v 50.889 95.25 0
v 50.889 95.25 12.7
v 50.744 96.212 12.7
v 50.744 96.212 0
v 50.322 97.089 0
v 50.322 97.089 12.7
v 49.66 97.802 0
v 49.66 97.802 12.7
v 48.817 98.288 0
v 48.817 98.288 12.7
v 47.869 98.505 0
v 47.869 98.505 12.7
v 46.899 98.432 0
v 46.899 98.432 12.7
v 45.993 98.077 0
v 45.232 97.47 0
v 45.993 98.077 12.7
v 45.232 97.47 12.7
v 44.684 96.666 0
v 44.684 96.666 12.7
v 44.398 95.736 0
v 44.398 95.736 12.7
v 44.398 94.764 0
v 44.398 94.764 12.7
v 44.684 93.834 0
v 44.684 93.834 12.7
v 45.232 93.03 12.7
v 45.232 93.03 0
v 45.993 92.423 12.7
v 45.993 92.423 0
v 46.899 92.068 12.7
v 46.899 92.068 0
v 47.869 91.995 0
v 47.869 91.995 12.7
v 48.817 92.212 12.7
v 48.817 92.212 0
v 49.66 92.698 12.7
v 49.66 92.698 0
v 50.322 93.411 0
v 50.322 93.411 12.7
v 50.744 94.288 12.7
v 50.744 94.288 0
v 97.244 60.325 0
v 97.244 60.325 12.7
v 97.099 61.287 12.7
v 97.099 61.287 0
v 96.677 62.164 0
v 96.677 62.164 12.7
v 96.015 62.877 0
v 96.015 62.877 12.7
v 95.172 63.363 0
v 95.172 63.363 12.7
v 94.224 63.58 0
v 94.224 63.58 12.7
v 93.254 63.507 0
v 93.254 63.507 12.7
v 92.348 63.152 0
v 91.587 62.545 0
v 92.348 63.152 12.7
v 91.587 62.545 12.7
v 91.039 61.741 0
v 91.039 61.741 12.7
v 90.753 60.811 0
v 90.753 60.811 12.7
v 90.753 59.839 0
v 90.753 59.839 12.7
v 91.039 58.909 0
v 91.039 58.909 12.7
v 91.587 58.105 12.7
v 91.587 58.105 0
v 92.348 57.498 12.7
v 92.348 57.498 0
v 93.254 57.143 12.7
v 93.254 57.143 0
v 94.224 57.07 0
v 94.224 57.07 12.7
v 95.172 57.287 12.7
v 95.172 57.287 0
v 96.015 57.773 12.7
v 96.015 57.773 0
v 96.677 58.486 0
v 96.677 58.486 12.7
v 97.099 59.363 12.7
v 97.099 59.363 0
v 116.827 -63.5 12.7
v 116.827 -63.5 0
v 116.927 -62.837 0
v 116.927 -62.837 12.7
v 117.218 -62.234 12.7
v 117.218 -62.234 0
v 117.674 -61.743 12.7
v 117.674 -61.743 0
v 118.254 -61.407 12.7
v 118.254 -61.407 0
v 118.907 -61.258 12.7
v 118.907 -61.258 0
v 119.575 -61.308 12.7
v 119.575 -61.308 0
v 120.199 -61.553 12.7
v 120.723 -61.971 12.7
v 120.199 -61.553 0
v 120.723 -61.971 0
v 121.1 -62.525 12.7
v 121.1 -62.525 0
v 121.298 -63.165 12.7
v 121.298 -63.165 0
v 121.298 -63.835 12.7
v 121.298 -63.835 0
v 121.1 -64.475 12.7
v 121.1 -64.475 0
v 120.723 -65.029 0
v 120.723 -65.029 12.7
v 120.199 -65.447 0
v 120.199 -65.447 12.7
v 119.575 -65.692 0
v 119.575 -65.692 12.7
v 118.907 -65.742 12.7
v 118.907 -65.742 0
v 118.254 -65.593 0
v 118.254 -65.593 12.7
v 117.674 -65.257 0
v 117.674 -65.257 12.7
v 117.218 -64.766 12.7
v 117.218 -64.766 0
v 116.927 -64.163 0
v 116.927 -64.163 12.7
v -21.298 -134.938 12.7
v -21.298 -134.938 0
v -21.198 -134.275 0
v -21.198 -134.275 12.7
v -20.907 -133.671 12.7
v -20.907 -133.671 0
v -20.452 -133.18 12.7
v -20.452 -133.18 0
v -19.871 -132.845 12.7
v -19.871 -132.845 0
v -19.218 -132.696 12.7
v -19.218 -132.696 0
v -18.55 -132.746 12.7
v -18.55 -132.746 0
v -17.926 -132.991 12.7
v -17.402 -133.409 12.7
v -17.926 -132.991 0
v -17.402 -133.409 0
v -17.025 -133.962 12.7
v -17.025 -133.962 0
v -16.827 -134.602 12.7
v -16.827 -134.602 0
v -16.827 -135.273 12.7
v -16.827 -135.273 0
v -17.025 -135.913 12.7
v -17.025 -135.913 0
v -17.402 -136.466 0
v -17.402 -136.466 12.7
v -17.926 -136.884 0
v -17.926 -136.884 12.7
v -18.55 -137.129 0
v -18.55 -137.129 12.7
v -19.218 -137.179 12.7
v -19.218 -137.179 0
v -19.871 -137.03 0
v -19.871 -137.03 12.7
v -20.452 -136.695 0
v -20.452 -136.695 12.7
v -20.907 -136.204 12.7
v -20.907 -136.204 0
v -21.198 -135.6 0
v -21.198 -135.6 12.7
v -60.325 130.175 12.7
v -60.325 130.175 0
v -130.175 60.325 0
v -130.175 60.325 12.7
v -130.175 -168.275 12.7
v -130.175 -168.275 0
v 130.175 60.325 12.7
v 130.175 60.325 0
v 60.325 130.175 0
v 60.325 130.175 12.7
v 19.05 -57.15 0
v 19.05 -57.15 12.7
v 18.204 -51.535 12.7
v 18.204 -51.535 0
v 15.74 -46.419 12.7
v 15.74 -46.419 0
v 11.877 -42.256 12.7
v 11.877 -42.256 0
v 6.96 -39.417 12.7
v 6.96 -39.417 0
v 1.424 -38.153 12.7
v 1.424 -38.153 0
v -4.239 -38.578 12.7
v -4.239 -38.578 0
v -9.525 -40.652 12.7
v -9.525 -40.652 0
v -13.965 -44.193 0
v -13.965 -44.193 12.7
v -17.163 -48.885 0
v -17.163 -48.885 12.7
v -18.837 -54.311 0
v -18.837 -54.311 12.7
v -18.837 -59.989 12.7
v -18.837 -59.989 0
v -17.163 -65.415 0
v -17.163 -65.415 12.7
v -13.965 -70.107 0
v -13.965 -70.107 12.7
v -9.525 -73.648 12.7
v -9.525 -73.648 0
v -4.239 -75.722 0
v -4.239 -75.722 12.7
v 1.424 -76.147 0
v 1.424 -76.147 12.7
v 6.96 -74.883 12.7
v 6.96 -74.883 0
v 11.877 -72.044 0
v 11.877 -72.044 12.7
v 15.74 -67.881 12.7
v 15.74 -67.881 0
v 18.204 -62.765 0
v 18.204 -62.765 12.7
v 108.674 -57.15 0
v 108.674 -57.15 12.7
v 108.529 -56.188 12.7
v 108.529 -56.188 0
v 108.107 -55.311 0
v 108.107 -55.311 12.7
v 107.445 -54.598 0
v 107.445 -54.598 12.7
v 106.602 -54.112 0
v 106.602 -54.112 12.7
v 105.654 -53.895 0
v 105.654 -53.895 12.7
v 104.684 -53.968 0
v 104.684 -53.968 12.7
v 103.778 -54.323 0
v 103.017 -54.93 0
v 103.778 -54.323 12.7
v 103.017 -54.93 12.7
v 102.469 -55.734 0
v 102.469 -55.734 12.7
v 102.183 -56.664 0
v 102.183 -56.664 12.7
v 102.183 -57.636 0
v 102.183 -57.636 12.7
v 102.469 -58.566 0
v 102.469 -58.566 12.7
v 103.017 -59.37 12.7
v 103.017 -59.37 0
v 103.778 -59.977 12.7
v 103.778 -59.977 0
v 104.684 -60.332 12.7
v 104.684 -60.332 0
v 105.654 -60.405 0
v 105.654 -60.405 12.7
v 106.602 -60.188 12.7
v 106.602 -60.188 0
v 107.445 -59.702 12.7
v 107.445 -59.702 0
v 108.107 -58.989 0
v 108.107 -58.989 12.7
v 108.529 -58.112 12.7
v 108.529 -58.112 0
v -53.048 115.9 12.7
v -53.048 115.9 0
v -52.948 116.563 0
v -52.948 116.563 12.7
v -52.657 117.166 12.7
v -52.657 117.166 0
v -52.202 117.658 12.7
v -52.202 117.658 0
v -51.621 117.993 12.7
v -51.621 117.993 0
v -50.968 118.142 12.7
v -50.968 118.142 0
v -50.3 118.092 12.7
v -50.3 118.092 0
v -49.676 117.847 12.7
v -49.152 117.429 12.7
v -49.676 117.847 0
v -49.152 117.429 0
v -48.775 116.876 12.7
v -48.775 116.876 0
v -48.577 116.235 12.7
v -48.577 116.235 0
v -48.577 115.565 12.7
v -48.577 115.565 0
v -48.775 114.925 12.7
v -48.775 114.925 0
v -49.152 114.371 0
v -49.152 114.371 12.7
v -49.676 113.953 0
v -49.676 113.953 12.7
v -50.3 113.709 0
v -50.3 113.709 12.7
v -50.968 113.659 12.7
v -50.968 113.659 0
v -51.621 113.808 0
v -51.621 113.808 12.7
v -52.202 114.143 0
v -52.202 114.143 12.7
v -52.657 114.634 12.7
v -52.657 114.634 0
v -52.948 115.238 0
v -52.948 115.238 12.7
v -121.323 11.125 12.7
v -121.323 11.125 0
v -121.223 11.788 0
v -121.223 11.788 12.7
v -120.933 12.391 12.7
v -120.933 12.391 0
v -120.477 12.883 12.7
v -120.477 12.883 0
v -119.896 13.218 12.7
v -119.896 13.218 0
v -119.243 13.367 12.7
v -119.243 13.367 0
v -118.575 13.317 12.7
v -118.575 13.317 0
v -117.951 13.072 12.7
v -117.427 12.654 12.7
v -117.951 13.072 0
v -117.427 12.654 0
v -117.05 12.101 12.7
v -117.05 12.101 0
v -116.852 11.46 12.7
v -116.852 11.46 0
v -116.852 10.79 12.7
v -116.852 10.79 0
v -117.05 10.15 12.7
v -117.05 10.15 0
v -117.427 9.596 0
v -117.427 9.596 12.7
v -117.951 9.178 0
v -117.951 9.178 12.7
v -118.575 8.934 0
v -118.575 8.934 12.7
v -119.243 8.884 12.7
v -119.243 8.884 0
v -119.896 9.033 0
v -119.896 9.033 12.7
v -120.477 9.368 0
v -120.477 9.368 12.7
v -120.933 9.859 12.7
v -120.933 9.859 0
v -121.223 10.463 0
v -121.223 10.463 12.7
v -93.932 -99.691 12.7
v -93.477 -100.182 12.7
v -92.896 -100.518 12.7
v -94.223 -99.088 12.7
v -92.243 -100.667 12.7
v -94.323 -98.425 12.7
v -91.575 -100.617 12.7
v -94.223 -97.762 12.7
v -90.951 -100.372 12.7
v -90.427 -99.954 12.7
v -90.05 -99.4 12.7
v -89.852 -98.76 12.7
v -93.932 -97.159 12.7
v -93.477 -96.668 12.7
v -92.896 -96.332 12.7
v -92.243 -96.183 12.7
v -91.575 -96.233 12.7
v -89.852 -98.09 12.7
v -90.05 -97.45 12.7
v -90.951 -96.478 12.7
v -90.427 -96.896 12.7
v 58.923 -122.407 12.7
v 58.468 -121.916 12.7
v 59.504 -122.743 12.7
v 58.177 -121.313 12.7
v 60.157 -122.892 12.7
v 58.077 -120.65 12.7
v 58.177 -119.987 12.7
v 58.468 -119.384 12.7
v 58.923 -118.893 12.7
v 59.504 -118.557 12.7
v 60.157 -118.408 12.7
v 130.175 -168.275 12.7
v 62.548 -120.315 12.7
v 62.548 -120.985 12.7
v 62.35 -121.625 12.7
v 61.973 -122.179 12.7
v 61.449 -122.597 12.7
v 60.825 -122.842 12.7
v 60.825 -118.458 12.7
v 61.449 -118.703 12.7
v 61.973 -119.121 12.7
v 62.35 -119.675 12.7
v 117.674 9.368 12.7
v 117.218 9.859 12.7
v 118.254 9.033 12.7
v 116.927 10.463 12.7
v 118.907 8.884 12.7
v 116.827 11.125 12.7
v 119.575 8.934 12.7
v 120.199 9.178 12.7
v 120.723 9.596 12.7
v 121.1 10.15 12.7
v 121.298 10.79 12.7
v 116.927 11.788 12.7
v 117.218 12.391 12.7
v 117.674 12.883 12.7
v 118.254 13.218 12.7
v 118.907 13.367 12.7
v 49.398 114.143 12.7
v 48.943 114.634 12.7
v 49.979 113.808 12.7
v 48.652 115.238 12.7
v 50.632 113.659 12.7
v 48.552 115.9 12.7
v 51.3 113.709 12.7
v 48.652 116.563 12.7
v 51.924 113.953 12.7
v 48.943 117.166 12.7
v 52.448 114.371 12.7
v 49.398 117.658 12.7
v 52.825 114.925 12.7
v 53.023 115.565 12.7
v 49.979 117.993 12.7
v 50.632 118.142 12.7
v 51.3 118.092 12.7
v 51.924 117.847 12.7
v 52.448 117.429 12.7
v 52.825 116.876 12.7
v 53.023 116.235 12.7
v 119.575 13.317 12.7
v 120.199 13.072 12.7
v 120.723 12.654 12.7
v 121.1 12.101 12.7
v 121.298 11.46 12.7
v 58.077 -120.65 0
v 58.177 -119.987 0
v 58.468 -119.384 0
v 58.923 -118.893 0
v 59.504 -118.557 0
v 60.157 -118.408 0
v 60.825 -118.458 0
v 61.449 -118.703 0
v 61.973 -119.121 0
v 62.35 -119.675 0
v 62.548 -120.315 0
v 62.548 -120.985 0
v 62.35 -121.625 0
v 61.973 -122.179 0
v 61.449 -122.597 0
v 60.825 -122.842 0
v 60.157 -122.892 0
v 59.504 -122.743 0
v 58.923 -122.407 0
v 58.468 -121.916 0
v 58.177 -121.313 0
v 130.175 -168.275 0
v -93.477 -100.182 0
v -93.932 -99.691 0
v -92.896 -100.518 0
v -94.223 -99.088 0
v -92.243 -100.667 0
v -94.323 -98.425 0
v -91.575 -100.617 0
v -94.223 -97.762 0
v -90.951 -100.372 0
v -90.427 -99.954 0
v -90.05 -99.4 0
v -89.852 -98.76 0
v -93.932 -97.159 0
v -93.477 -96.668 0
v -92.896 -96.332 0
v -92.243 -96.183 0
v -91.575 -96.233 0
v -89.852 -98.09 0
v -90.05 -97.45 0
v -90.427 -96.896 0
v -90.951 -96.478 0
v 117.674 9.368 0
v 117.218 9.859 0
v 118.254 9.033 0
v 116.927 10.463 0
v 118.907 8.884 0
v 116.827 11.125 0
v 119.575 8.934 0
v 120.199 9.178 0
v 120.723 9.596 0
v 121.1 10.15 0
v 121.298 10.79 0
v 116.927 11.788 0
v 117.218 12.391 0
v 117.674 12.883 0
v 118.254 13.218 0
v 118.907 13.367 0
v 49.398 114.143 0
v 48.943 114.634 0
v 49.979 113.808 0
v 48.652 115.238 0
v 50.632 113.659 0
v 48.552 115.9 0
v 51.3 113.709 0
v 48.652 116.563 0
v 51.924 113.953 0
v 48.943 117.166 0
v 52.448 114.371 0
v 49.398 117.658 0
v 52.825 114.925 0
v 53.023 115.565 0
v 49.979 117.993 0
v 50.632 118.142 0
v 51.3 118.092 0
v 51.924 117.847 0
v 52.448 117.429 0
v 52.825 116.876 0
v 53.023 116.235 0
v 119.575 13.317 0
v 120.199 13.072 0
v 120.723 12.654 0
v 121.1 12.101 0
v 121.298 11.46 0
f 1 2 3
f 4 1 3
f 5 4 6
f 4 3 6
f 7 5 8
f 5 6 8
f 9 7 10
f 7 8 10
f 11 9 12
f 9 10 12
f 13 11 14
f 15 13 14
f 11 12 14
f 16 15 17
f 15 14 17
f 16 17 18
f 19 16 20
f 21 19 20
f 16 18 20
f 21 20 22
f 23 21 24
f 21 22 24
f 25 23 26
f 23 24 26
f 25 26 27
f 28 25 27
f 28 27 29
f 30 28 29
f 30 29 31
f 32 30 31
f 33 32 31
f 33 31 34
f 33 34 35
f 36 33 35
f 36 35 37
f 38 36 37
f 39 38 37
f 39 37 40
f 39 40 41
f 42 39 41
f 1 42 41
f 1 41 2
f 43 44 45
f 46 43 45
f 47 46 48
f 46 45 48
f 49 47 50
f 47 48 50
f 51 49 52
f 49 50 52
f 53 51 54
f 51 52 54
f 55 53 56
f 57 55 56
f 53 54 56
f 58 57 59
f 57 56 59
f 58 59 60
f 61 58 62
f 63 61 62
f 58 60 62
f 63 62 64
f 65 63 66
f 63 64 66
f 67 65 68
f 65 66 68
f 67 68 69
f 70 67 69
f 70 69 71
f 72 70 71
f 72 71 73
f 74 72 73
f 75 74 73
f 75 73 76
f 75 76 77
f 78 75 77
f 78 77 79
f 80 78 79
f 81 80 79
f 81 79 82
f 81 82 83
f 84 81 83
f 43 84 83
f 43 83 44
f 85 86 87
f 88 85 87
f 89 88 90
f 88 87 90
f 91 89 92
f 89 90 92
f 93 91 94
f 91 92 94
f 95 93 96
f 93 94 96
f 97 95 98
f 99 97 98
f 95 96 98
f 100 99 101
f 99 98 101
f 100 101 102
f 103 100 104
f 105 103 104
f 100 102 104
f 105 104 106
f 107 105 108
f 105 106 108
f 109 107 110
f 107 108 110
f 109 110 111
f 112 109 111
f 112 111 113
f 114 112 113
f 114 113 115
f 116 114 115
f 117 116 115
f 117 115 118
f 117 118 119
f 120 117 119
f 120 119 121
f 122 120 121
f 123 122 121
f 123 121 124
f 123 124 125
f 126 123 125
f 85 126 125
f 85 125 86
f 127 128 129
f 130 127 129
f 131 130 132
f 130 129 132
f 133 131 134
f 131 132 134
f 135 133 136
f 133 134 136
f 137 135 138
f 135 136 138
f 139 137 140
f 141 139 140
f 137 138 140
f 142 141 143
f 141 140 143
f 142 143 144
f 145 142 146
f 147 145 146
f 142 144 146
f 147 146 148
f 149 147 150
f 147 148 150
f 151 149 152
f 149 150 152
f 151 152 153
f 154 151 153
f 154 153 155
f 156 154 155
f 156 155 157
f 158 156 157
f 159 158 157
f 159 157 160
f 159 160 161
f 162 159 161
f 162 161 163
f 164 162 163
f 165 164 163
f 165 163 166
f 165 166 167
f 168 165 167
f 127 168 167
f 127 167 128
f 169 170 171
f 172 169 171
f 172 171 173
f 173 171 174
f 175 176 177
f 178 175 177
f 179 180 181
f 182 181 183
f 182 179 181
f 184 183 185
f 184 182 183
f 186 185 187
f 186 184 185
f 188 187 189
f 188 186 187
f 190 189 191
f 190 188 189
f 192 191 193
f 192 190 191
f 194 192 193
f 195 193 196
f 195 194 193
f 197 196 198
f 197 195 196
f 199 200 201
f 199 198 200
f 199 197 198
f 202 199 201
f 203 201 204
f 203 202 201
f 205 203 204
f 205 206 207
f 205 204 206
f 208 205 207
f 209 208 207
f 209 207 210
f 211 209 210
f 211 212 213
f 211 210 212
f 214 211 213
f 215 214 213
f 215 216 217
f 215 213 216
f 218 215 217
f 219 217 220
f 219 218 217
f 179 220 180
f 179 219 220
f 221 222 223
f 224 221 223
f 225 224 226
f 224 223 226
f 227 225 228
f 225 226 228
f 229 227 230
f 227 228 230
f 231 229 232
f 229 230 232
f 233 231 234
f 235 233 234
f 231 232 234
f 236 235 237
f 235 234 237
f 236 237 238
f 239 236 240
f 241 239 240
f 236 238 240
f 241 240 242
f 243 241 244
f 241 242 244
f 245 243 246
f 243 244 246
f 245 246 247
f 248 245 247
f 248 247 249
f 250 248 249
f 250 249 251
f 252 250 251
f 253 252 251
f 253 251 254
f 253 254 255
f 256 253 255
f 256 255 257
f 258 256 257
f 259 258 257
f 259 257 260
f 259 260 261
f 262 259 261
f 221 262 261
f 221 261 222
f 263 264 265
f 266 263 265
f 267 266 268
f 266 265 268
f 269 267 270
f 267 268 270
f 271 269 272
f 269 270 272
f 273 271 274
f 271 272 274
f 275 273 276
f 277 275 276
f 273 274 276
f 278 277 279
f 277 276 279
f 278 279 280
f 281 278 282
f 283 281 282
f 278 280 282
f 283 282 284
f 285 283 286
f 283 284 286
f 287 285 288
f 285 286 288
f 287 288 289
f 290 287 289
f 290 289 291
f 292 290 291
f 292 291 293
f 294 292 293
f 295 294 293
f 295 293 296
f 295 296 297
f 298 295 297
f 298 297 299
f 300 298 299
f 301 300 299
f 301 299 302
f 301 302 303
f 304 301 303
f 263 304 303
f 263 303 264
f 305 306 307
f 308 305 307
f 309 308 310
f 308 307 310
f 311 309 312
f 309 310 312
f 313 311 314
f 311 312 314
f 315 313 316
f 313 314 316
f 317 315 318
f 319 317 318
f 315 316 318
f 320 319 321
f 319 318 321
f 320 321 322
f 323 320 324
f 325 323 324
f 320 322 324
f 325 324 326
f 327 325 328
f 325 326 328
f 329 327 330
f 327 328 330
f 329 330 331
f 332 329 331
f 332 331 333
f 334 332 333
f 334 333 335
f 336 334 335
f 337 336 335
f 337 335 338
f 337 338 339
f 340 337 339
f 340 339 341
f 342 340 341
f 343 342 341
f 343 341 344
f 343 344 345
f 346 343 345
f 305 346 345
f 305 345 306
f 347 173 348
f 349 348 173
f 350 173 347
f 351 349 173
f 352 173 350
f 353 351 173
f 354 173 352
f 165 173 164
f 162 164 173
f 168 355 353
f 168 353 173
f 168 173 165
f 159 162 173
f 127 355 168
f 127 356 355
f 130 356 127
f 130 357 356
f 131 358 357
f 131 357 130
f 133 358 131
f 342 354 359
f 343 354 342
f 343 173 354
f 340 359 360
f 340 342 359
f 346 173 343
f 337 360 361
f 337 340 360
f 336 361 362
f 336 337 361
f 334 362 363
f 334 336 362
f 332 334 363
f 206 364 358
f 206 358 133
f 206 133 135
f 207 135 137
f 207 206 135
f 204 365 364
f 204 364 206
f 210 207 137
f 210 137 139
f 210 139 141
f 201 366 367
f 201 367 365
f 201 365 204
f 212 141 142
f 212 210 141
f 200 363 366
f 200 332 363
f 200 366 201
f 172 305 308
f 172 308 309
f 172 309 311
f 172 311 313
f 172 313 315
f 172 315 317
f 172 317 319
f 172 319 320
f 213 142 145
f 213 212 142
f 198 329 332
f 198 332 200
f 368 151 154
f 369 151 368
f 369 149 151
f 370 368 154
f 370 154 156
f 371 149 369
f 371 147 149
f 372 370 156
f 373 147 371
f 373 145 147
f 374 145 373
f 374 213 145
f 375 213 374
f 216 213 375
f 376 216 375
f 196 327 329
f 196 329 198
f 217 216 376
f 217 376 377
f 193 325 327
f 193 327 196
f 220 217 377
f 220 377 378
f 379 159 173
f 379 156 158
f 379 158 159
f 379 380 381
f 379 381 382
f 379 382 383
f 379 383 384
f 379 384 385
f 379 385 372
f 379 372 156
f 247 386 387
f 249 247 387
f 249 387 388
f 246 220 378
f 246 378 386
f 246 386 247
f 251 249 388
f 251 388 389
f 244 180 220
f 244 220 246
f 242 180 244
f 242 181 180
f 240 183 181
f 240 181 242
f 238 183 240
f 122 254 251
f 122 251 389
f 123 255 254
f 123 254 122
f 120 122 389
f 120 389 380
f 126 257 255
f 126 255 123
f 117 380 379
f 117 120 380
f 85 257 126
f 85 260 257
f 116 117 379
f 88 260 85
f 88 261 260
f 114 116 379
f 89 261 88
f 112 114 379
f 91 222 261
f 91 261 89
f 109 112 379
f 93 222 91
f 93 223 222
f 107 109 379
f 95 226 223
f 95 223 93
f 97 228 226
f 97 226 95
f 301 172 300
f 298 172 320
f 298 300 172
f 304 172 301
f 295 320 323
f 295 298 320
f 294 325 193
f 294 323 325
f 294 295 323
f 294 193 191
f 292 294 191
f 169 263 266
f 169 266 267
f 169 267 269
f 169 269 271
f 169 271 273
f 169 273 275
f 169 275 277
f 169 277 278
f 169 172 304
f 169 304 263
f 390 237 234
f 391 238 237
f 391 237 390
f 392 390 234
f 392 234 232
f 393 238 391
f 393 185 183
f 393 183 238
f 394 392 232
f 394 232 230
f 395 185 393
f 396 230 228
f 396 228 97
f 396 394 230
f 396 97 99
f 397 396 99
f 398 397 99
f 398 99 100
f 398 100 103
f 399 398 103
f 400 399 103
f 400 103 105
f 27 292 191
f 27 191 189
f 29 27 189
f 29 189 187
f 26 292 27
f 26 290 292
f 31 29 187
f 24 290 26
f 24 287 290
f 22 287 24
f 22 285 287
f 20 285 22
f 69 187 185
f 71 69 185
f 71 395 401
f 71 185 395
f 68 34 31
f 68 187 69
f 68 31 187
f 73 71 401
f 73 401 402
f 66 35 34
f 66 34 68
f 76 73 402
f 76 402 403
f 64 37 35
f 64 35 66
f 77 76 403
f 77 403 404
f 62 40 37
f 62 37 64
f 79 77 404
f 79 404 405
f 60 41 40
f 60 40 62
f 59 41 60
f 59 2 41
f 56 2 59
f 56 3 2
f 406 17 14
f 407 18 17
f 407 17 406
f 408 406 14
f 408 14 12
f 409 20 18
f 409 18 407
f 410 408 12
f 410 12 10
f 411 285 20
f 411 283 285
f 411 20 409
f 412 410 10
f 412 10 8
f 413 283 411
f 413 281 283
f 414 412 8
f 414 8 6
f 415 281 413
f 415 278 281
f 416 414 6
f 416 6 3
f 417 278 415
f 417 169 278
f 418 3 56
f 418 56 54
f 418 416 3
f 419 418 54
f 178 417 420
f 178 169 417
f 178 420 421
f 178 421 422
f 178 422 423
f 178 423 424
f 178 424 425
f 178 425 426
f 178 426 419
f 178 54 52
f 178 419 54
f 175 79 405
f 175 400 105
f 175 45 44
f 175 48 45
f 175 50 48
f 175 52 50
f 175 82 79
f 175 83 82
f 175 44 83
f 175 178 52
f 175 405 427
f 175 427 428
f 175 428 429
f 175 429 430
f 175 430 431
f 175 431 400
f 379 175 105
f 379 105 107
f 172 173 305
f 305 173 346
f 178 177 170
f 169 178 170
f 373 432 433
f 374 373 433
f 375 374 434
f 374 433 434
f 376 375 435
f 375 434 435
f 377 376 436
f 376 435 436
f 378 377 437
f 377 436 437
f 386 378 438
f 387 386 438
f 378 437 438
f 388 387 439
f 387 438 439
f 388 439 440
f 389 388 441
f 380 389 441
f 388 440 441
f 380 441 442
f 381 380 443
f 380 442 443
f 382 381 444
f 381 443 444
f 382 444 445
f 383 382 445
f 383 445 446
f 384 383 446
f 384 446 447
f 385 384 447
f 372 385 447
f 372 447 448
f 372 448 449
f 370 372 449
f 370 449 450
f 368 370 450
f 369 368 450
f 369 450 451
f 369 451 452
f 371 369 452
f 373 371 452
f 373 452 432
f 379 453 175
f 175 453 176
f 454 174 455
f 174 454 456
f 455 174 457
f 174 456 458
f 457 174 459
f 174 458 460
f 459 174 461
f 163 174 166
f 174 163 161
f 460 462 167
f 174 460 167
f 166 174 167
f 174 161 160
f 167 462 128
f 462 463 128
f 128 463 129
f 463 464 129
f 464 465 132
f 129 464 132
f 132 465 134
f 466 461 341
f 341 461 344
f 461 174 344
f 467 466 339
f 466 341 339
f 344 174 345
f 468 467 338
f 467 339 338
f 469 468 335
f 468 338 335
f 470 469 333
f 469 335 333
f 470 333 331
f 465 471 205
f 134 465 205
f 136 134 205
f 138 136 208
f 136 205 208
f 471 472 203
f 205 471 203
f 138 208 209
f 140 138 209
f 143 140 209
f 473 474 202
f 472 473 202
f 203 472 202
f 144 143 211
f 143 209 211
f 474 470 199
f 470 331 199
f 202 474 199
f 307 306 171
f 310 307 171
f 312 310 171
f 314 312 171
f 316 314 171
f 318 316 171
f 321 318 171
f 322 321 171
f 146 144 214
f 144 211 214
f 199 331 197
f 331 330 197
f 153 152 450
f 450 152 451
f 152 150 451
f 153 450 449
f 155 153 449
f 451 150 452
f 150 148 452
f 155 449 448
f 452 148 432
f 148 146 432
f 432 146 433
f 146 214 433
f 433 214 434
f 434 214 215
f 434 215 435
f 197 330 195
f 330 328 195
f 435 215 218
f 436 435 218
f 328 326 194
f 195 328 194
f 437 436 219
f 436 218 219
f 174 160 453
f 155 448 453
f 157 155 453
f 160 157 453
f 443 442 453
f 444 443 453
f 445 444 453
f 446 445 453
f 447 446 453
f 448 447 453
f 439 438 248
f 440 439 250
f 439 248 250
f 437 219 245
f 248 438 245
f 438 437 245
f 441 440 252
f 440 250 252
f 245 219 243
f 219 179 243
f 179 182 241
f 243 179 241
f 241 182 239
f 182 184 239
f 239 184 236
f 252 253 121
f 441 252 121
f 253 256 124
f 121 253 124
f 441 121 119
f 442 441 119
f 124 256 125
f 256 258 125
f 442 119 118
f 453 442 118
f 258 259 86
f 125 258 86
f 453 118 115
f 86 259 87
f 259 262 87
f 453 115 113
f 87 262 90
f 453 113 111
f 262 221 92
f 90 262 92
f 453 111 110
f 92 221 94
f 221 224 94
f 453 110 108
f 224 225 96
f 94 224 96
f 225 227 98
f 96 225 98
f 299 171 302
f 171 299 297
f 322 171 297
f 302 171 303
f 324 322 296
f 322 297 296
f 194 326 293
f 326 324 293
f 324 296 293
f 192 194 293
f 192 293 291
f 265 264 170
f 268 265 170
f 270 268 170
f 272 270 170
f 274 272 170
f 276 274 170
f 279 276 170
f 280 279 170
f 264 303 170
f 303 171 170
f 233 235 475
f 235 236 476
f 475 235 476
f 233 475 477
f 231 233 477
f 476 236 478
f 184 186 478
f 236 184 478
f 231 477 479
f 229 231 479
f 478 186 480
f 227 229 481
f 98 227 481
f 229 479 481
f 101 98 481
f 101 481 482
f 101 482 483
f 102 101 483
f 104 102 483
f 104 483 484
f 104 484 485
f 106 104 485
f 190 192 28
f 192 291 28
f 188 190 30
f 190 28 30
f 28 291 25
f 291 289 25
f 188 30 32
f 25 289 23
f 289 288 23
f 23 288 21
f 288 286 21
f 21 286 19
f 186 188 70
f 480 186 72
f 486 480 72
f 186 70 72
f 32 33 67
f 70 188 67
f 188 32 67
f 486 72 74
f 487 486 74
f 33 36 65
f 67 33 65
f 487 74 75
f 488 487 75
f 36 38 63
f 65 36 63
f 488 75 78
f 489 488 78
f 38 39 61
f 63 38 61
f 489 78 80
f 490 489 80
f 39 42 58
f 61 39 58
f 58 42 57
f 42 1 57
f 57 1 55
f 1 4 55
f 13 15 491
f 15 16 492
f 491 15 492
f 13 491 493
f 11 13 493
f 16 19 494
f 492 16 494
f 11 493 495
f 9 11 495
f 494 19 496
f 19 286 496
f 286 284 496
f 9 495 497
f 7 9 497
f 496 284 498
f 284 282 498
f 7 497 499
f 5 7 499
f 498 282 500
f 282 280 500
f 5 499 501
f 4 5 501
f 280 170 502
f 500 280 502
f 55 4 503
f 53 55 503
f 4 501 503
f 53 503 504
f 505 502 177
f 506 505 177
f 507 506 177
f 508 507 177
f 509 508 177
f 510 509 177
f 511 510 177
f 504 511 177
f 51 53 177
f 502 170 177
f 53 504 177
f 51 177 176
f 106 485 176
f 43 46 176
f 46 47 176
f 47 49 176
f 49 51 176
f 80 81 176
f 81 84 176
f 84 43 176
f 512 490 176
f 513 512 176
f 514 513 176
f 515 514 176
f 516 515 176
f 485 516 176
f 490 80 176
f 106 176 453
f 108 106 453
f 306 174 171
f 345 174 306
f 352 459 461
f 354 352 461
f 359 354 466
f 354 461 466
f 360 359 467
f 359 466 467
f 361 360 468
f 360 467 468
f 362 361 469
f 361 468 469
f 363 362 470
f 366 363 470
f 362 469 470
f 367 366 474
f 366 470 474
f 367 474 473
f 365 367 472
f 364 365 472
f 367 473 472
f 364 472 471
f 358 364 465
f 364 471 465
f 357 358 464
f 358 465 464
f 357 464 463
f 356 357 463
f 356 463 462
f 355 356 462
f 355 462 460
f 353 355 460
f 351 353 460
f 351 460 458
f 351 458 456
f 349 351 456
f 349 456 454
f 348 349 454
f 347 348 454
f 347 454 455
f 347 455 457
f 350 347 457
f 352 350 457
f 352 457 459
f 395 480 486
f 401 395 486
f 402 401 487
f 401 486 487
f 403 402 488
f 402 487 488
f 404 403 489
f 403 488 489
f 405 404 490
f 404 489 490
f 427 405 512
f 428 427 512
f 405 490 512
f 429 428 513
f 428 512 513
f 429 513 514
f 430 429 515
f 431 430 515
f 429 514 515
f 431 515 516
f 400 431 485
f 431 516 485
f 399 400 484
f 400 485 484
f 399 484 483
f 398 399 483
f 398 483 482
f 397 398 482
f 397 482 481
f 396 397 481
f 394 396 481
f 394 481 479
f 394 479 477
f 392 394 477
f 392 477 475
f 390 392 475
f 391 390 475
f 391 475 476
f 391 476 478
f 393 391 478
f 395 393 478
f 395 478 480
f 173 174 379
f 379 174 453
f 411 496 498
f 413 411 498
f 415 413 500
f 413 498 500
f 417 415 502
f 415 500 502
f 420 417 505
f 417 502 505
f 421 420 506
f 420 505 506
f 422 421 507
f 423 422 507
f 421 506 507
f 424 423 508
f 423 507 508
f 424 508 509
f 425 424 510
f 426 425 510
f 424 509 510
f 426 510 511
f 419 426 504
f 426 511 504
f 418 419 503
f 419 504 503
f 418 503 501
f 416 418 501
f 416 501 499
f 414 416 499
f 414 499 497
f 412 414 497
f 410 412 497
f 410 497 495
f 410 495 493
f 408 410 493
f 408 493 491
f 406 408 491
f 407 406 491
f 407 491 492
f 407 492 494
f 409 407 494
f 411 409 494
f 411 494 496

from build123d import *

# Parameters (mm, degrees)
BOSS_EXTRUDE1_DEPTH         = 12.7
SKETCH2_R                   = 19.05
CUT_EXTRUDE1_DEPTH          = 214.127417875
F_16_0_177_DIAMETER_HOLE1_D = 4.4958
F_0_257_DIAMETER_HOLE1_D    = 6.5278


with BuildPart() as part:
    # Sketch1 → Boss-Extrude1 (new body)
    with BuildSketch(Plane.XY):
        Polygon((-130.175, -168.275), (130.175, -168.275), (130.175, 60.325), (60.325, 130.175), (-60.325, 130.175), (-130.175, 60.325), align=None)
    extrude(amount=BOSS_EXTRUDE1_DEPTH)

    # Sketch2 → Cut-Extrude1 (cut, through all)
    with BuildSketch(Plane.XY):
        with Locations((0, -57.15)):
            Circle(SKETCH2_R)
    extrude(amount=CUT_EXTRUDE1_DEPTH, mode=Mode.SUBTRACT)

    # #16 (0.177) Diameter Hole1 (through all)
    with Locations(Plane.XY.offset(12.7)):
        with Locations((-50.8, 115.9002), (50.8, 115.9002), (119.0752, 11.1252), (119.0752, -63.5), (60.325, -120.65), (-19.05, -134.9375), (-92.075, -98.425), (-119.0752, 11.1252)):
            Hole(F_16_0_177_DIAMETER_HOLE1_D / 2)

    # F (0.257) Diameter Hole1 (through all)
    with Locations(Plane(origin=(0, 0, 0), x_dir=(-1, 0, 0), z_dir=(0, 0, -1))):
        with Locations((-105.41, -57.15), (-93.98, 60.325), (-47.625, 95.25)):
            Hole(F_0_257_DIAMETER_HOLE1_D / 2)


solid = part.part
